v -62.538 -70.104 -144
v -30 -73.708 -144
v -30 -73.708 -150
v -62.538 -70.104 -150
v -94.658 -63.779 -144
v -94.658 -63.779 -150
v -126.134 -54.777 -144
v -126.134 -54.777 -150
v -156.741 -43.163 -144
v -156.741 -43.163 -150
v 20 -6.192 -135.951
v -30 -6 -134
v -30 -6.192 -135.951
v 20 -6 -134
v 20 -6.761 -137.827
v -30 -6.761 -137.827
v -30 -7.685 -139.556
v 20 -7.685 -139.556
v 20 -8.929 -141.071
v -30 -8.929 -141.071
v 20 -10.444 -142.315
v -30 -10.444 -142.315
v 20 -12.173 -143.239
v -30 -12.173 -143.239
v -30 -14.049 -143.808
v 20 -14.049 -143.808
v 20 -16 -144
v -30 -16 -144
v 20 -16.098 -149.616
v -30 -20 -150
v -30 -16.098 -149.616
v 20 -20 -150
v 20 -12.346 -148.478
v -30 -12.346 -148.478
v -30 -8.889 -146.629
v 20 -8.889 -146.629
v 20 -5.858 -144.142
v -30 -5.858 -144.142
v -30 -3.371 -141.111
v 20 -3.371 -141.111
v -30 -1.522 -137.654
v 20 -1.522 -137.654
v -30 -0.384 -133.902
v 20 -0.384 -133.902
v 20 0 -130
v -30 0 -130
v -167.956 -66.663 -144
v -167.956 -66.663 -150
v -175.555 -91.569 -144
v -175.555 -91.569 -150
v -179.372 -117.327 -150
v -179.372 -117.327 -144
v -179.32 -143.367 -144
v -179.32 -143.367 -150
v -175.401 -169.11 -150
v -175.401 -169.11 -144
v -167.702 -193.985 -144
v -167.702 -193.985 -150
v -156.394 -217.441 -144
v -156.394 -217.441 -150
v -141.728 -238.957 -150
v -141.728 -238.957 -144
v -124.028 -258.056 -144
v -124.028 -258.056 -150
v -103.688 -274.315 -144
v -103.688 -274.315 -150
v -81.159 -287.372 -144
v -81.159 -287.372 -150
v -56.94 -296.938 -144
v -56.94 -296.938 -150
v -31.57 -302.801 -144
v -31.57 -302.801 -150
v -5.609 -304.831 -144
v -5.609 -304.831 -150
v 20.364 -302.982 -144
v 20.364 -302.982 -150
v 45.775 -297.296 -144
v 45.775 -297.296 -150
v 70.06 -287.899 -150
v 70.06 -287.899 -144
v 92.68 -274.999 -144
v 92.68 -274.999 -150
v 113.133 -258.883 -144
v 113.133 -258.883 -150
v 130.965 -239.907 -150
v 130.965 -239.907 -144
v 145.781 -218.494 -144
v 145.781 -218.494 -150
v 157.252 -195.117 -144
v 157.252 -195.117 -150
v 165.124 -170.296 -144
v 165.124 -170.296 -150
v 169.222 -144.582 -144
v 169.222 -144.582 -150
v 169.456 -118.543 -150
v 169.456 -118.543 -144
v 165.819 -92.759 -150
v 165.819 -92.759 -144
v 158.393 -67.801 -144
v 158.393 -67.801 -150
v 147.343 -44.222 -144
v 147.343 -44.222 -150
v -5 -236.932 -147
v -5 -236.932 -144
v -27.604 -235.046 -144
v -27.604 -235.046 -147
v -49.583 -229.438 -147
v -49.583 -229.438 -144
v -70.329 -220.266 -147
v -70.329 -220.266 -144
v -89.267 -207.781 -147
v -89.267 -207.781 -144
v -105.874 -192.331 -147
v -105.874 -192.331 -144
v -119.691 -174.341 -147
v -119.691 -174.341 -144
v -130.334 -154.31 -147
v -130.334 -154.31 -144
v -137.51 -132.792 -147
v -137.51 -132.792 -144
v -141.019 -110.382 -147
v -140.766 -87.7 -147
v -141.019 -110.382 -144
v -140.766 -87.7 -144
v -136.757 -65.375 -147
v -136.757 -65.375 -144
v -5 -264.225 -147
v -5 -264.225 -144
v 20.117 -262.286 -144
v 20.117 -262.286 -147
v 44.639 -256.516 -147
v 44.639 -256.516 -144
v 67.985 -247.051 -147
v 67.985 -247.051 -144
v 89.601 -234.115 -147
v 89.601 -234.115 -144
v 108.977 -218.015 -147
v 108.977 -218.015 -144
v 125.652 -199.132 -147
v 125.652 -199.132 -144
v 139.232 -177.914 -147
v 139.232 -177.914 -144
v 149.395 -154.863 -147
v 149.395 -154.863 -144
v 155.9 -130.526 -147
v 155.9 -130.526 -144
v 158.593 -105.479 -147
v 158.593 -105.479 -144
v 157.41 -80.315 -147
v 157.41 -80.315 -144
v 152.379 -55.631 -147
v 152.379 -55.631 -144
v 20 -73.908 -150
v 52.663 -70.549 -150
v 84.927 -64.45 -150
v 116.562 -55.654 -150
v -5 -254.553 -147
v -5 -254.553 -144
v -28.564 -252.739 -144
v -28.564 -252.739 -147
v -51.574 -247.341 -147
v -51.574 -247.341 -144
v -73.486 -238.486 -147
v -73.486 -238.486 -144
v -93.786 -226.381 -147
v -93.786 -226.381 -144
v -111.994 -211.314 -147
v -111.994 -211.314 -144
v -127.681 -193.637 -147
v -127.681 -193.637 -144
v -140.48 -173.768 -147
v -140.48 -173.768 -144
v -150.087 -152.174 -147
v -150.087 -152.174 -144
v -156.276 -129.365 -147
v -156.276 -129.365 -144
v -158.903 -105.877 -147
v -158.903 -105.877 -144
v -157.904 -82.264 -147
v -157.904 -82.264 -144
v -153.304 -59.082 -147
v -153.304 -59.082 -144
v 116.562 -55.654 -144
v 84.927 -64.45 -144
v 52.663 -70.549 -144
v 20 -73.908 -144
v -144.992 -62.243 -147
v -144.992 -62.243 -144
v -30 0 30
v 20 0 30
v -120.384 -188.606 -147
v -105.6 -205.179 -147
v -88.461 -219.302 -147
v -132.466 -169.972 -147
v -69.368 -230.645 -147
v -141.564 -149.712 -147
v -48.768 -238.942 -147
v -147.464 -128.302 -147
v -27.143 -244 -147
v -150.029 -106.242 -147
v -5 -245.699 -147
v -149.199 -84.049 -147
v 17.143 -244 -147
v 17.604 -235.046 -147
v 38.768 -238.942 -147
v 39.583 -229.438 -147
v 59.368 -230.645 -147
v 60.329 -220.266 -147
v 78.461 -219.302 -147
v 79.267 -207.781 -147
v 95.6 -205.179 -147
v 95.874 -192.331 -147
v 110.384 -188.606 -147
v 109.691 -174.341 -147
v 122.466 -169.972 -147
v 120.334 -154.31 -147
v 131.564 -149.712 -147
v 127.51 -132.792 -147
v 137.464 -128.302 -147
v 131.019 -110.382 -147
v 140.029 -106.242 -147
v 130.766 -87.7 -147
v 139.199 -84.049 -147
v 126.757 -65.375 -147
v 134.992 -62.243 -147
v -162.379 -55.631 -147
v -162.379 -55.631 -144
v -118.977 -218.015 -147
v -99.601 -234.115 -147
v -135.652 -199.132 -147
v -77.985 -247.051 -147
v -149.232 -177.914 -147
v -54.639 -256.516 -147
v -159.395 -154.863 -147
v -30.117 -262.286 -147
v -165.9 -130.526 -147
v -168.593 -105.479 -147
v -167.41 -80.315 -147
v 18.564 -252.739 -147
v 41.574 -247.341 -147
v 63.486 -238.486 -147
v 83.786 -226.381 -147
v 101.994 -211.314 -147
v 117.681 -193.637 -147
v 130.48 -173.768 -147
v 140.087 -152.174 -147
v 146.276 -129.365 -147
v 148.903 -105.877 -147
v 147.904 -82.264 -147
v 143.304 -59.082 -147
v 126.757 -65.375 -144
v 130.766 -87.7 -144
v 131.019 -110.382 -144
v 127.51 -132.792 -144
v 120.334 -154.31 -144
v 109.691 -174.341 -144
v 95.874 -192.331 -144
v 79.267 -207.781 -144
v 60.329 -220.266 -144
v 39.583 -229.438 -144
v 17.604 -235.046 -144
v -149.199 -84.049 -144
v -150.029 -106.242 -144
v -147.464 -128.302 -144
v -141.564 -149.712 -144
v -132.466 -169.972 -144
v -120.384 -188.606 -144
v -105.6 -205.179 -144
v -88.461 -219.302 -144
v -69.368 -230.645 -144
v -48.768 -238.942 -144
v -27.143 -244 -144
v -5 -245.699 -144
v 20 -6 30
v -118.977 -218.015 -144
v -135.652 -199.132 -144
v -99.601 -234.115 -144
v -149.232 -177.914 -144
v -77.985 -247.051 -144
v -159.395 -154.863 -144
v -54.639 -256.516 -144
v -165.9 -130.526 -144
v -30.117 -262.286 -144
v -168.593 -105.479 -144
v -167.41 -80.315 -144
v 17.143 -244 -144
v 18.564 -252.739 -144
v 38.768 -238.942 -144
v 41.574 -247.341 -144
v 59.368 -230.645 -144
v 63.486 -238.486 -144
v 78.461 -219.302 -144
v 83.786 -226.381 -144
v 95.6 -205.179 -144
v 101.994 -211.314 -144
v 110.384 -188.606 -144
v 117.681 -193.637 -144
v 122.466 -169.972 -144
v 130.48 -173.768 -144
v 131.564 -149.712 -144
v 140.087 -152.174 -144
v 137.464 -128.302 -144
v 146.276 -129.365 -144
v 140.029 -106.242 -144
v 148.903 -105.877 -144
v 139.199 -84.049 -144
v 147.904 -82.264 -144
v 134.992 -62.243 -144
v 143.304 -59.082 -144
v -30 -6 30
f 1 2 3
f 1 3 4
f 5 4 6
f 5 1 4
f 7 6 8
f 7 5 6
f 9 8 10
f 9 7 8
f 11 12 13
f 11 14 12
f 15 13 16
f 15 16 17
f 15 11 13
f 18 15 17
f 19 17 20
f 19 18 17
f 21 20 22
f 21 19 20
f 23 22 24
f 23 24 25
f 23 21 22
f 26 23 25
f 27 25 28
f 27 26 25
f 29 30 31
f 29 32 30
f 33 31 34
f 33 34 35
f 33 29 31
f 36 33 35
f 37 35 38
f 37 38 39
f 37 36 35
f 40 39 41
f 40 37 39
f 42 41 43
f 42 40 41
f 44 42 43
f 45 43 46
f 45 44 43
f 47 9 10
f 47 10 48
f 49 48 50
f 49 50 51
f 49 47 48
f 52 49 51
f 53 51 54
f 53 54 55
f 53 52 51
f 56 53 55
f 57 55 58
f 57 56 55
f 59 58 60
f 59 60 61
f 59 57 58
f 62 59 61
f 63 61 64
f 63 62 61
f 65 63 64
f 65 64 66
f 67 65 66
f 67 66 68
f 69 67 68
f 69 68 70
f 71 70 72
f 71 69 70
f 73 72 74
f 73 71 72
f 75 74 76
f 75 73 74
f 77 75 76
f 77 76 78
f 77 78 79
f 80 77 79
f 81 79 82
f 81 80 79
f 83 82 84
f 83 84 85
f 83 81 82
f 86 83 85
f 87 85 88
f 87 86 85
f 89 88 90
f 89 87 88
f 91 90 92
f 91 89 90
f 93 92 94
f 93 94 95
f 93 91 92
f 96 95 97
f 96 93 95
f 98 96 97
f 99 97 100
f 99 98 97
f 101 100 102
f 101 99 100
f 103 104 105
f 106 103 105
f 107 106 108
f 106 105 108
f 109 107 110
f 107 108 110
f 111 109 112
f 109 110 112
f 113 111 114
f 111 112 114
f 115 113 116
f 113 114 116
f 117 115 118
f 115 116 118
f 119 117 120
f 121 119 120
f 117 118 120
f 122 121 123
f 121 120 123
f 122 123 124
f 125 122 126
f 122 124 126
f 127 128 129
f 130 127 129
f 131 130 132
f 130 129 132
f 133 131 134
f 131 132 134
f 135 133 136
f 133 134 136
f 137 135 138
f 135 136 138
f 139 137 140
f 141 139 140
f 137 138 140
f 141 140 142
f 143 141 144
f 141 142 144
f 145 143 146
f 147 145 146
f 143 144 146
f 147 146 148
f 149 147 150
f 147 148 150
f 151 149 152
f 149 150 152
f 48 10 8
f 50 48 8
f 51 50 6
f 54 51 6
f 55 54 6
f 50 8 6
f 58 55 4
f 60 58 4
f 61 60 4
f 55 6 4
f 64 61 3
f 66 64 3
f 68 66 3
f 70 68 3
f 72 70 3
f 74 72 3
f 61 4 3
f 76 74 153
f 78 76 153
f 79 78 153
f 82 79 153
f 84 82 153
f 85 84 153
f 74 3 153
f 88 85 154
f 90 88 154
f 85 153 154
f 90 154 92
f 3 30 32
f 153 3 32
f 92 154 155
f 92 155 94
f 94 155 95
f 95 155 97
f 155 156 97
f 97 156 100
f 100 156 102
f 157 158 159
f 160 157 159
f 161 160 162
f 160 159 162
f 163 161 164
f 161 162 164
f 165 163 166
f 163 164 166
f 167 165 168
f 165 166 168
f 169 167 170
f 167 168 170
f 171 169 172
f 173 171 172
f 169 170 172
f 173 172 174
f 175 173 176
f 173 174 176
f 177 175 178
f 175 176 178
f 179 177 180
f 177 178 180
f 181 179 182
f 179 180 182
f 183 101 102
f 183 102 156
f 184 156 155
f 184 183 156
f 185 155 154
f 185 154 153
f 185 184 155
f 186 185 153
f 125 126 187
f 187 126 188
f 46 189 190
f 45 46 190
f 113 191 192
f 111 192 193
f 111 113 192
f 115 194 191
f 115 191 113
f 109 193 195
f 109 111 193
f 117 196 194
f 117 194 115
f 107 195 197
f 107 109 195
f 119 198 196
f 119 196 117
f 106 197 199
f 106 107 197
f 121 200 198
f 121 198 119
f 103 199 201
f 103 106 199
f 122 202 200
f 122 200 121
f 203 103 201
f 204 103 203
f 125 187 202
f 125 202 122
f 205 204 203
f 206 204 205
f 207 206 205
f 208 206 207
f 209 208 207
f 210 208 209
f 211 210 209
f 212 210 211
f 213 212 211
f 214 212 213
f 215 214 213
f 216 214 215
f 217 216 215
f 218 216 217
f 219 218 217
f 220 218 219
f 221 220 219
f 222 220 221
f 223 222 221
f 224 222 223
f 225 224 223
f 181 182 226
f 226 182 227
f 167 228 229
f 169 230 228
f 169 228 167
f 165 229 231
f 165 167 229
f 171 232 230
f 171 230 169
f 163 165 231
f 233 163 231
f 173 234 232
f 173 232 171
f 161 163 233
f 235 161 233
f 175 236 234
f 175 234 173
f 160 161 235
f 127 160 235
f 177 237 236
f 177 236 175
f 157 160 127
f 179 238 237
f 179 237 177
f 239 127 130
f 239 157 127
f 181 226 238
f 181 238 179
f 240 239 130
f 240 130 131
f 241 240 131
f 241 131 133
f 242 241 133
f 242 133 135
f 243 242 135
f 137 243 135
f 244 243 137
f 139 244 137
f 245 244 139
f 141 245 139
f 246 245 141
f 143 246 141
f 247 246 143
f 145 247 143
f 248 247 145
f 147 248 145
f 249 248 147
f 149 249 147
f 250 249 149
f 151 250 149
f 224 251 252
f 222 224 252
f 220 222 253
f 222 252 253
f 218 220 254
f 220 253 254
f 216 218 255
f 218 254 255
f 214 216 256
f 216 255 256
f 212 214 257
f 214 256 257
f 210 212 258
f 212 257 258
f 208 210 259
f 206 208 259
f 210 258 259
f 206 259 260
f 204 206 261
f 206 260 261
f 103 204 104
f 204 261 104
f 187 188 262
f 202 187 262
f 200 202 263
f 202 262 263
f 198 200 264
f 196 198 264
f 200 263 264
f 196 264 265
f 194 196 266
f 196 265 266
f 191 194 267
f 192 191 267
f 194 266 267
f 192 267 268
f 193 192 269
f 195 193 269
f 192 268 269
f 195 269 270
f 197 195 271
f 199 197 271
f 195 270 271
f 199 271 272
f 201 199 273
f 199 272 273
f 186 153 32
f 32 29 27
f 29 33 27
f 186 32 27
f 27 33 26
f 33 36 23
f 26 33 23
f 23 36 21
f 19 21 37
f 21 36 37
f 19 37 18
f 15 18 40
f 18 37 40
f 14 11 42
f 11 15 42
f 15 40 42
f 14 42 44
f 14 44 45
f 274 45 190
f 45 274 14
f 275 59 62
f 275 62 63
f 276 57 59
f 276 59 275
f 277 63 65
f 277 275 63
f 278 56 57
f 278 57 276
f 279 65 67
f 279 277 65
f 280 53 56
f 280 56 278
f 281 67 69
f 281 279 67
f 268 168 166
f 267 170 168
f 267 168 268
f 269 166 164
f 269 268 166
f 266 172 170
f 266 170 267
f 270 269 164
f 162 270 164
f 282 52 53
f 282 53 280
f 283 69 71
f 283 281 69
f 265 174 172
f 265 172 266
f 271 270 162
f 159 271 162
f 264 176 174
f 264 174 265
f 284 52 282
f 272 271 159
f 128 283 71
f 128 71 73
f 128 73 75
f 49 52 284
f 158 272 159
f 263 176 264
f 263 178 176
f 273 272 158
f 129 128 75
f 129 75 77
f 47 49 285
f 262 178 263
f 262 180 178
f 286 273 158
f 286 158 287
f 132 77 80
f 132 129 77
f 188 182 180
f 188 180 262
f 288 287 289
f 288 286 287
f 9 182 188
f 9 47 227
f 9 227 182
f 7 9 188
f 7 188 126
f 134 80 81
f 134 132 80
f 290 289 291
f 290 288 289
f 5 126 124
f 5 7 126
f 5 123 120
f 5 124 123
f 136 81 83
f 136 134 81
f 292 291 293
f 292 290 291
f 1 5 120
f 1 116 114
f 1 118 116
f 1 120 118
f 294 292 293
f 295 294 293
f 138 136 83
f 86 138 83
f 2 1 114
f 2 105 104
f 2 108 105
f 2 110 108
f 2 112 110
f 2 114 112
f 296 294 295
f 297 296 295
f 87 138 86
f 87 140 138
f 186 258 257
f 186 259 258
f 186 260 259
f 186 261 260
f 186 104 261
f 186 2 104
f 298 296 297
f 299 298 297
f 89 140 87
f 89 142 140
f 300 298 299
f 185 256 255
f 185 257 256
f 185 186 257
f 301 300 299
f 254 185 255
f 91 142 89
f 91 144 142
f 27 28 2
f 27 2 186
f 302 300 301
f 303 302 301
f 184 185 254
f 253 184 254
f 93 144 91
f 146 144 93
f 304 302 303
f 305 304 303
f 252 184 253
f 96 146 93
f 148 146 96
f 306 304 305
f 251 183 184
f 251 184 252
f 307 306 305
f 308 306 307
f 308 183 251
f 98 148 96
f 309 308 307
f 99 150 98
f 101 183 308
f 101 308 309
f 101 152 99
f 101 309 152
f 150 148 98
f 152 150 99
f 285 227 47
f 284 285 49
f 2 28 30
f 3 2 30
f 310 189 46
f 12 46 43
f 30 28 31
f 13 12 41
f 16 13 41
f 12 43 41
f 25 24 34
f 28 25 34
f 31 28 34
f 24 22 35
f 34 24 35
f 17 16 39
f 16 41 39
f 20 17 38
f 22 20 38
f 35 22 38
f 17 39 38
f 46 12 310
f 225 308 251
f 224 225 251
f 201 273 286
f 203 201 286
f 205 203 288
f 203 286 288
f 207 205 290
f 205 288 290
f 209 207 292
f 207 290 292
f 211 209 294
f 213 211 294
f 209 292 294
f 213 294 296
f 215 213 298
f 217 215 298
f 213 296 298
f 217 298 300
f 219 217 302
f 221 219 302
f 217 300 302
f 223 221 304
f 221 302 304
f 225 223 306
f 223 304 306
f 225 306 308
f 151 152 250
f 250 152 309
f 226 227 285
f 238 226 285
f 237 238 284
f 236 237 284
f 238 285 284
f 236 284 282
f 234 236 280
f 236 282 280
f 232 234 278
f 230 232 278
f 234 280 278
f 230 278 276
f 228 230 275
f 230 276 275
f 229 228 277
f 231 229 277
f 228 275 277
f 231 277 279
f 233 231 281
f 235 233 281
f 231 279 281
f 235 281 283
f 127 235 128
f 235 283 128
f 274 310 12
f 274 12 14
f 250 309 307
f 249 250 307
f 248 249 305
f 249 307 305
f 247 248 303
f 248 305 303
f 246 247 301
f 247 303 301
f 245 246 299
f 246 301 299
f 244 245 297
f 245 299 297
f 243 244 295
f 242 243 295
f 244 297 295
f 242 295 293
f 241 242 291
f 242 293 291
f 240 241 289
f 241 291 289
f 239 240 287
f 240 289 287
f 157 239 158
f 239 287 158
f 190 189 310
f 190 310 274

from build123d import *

# Parameters (mm, degrees)
F0_W     = 50
F0_H     = 6
F2_DEPTH = 130
F0_H_2   = 100
F0_H_3   = 74
F3_DEPTH = 6
F4_R     = 20
F5_R     = 10
F7_DEPTH = 6
F9_DEPTH = 3


with BuildPart() as f2:
    # F0 (on Front) → F2 (new body)
    with BuildSketch(Plane.XZ):
        with Locations((-5, -147)):
            Rectangle(F0_W, F0_H)
    extrude(amount=F2_DEPTH)

    # F0 (on Front) → F3 (join)
    with BuildSketch(Plane.XZ):
        with Locations((-5, -20)):
            Rectangle(F0_W, F0_H_2)
        with Locations((-5, -107)):
            Rectangle(F0_W, F0_H_3)
        with Locations((-5, -147)):
            Rectangle(F0_W, F0_H)
    extrude(amount=F3_DEPTH)

    # F4
    f4_edges = [f2.edges().sort_by_distance(p)[0] for p in [
        (-5, 0, -150),
    ]]
    fillet(f4_edges, radius=F4_R)

    # F5
    f5_edges = [f2.edges().sort_by_distance(p)[0] for p in [
        (-5, -6, -144),
    ]]
    fillet(f5_edges, radius=F5_R)

    # F6 (on face) → F7 (join)
    with BuildSketch(Plane.XY.offset(-144)):
        with BuildLine():
            ThreePointArc((-30, -73.708494), (-94.658376, -63.779027), (-156.74109, -43.162615))
            ThreePointArc((-156.74109, -43.162615), (-5.609318, -304.830543), (147.342686, -44.222404))
            ThreePointArc((147.342686, -44.222404), (84.92667, -64.450181), (20, -73.90796))
            Line((20, -73.90796), (20, -130))
            Line((20, -130), (-30, -130))
            Line((-30, -130), (-30, -73.708494))
        make_face()
    extrude(amount=-F7_DEPTH)

    # F8 (on face) → F9 (cut)
    with BuildSketch(Plane.XY.offset(-144)):
        with BuildLine():
            ThreePointArc((-5, -254.552964), (-127.681443, -193.636873), (-153.304019, -59.082088))
            Line((-153.304019, -59.082088), (-162.379453, -55.630867))
            ThreePointArc((-162.379453, -55.630867), (-135.651994, -199.132241), (-5, -264.224927))
            ThreePointArc((-5, -264.224927), (125.651994, -199.132241), (152.379453, -55.630867))
            Line((152.379453, -55.630867), (143.304019, -59.082088))
            ThreePointArc((143.304019, -59.082088), (117.681443, -193.636873), (-5, -254.552964))
        make_face()
        with BuildLine():
            Line((-136.756967, -65.374629), (-144.992024, -62.242987))
            ThreePointArc((-144.992024, -62.242987), (-120.384014, -188.605777), (-5, -245.699019))
            ThreePointArc((-5, -245.699019), (110.384014, -188.605777), (134.992024, -62.242987))
            Line((134.992024, -62.242987), (126.756967, -65.374629))
            ThreePointArc((126.756967, -65.374629), (103.157098, -183.623516), (-5, -236.932005))
            ThreePointArc((-5, -236.932005), (-113.157098, -183.623516), (-136.756967, -65.374629))
        make_face()
    extrude(amount=-F9_DEPTH, mode=Mode.SUBTRACT)


solid = f2.part
